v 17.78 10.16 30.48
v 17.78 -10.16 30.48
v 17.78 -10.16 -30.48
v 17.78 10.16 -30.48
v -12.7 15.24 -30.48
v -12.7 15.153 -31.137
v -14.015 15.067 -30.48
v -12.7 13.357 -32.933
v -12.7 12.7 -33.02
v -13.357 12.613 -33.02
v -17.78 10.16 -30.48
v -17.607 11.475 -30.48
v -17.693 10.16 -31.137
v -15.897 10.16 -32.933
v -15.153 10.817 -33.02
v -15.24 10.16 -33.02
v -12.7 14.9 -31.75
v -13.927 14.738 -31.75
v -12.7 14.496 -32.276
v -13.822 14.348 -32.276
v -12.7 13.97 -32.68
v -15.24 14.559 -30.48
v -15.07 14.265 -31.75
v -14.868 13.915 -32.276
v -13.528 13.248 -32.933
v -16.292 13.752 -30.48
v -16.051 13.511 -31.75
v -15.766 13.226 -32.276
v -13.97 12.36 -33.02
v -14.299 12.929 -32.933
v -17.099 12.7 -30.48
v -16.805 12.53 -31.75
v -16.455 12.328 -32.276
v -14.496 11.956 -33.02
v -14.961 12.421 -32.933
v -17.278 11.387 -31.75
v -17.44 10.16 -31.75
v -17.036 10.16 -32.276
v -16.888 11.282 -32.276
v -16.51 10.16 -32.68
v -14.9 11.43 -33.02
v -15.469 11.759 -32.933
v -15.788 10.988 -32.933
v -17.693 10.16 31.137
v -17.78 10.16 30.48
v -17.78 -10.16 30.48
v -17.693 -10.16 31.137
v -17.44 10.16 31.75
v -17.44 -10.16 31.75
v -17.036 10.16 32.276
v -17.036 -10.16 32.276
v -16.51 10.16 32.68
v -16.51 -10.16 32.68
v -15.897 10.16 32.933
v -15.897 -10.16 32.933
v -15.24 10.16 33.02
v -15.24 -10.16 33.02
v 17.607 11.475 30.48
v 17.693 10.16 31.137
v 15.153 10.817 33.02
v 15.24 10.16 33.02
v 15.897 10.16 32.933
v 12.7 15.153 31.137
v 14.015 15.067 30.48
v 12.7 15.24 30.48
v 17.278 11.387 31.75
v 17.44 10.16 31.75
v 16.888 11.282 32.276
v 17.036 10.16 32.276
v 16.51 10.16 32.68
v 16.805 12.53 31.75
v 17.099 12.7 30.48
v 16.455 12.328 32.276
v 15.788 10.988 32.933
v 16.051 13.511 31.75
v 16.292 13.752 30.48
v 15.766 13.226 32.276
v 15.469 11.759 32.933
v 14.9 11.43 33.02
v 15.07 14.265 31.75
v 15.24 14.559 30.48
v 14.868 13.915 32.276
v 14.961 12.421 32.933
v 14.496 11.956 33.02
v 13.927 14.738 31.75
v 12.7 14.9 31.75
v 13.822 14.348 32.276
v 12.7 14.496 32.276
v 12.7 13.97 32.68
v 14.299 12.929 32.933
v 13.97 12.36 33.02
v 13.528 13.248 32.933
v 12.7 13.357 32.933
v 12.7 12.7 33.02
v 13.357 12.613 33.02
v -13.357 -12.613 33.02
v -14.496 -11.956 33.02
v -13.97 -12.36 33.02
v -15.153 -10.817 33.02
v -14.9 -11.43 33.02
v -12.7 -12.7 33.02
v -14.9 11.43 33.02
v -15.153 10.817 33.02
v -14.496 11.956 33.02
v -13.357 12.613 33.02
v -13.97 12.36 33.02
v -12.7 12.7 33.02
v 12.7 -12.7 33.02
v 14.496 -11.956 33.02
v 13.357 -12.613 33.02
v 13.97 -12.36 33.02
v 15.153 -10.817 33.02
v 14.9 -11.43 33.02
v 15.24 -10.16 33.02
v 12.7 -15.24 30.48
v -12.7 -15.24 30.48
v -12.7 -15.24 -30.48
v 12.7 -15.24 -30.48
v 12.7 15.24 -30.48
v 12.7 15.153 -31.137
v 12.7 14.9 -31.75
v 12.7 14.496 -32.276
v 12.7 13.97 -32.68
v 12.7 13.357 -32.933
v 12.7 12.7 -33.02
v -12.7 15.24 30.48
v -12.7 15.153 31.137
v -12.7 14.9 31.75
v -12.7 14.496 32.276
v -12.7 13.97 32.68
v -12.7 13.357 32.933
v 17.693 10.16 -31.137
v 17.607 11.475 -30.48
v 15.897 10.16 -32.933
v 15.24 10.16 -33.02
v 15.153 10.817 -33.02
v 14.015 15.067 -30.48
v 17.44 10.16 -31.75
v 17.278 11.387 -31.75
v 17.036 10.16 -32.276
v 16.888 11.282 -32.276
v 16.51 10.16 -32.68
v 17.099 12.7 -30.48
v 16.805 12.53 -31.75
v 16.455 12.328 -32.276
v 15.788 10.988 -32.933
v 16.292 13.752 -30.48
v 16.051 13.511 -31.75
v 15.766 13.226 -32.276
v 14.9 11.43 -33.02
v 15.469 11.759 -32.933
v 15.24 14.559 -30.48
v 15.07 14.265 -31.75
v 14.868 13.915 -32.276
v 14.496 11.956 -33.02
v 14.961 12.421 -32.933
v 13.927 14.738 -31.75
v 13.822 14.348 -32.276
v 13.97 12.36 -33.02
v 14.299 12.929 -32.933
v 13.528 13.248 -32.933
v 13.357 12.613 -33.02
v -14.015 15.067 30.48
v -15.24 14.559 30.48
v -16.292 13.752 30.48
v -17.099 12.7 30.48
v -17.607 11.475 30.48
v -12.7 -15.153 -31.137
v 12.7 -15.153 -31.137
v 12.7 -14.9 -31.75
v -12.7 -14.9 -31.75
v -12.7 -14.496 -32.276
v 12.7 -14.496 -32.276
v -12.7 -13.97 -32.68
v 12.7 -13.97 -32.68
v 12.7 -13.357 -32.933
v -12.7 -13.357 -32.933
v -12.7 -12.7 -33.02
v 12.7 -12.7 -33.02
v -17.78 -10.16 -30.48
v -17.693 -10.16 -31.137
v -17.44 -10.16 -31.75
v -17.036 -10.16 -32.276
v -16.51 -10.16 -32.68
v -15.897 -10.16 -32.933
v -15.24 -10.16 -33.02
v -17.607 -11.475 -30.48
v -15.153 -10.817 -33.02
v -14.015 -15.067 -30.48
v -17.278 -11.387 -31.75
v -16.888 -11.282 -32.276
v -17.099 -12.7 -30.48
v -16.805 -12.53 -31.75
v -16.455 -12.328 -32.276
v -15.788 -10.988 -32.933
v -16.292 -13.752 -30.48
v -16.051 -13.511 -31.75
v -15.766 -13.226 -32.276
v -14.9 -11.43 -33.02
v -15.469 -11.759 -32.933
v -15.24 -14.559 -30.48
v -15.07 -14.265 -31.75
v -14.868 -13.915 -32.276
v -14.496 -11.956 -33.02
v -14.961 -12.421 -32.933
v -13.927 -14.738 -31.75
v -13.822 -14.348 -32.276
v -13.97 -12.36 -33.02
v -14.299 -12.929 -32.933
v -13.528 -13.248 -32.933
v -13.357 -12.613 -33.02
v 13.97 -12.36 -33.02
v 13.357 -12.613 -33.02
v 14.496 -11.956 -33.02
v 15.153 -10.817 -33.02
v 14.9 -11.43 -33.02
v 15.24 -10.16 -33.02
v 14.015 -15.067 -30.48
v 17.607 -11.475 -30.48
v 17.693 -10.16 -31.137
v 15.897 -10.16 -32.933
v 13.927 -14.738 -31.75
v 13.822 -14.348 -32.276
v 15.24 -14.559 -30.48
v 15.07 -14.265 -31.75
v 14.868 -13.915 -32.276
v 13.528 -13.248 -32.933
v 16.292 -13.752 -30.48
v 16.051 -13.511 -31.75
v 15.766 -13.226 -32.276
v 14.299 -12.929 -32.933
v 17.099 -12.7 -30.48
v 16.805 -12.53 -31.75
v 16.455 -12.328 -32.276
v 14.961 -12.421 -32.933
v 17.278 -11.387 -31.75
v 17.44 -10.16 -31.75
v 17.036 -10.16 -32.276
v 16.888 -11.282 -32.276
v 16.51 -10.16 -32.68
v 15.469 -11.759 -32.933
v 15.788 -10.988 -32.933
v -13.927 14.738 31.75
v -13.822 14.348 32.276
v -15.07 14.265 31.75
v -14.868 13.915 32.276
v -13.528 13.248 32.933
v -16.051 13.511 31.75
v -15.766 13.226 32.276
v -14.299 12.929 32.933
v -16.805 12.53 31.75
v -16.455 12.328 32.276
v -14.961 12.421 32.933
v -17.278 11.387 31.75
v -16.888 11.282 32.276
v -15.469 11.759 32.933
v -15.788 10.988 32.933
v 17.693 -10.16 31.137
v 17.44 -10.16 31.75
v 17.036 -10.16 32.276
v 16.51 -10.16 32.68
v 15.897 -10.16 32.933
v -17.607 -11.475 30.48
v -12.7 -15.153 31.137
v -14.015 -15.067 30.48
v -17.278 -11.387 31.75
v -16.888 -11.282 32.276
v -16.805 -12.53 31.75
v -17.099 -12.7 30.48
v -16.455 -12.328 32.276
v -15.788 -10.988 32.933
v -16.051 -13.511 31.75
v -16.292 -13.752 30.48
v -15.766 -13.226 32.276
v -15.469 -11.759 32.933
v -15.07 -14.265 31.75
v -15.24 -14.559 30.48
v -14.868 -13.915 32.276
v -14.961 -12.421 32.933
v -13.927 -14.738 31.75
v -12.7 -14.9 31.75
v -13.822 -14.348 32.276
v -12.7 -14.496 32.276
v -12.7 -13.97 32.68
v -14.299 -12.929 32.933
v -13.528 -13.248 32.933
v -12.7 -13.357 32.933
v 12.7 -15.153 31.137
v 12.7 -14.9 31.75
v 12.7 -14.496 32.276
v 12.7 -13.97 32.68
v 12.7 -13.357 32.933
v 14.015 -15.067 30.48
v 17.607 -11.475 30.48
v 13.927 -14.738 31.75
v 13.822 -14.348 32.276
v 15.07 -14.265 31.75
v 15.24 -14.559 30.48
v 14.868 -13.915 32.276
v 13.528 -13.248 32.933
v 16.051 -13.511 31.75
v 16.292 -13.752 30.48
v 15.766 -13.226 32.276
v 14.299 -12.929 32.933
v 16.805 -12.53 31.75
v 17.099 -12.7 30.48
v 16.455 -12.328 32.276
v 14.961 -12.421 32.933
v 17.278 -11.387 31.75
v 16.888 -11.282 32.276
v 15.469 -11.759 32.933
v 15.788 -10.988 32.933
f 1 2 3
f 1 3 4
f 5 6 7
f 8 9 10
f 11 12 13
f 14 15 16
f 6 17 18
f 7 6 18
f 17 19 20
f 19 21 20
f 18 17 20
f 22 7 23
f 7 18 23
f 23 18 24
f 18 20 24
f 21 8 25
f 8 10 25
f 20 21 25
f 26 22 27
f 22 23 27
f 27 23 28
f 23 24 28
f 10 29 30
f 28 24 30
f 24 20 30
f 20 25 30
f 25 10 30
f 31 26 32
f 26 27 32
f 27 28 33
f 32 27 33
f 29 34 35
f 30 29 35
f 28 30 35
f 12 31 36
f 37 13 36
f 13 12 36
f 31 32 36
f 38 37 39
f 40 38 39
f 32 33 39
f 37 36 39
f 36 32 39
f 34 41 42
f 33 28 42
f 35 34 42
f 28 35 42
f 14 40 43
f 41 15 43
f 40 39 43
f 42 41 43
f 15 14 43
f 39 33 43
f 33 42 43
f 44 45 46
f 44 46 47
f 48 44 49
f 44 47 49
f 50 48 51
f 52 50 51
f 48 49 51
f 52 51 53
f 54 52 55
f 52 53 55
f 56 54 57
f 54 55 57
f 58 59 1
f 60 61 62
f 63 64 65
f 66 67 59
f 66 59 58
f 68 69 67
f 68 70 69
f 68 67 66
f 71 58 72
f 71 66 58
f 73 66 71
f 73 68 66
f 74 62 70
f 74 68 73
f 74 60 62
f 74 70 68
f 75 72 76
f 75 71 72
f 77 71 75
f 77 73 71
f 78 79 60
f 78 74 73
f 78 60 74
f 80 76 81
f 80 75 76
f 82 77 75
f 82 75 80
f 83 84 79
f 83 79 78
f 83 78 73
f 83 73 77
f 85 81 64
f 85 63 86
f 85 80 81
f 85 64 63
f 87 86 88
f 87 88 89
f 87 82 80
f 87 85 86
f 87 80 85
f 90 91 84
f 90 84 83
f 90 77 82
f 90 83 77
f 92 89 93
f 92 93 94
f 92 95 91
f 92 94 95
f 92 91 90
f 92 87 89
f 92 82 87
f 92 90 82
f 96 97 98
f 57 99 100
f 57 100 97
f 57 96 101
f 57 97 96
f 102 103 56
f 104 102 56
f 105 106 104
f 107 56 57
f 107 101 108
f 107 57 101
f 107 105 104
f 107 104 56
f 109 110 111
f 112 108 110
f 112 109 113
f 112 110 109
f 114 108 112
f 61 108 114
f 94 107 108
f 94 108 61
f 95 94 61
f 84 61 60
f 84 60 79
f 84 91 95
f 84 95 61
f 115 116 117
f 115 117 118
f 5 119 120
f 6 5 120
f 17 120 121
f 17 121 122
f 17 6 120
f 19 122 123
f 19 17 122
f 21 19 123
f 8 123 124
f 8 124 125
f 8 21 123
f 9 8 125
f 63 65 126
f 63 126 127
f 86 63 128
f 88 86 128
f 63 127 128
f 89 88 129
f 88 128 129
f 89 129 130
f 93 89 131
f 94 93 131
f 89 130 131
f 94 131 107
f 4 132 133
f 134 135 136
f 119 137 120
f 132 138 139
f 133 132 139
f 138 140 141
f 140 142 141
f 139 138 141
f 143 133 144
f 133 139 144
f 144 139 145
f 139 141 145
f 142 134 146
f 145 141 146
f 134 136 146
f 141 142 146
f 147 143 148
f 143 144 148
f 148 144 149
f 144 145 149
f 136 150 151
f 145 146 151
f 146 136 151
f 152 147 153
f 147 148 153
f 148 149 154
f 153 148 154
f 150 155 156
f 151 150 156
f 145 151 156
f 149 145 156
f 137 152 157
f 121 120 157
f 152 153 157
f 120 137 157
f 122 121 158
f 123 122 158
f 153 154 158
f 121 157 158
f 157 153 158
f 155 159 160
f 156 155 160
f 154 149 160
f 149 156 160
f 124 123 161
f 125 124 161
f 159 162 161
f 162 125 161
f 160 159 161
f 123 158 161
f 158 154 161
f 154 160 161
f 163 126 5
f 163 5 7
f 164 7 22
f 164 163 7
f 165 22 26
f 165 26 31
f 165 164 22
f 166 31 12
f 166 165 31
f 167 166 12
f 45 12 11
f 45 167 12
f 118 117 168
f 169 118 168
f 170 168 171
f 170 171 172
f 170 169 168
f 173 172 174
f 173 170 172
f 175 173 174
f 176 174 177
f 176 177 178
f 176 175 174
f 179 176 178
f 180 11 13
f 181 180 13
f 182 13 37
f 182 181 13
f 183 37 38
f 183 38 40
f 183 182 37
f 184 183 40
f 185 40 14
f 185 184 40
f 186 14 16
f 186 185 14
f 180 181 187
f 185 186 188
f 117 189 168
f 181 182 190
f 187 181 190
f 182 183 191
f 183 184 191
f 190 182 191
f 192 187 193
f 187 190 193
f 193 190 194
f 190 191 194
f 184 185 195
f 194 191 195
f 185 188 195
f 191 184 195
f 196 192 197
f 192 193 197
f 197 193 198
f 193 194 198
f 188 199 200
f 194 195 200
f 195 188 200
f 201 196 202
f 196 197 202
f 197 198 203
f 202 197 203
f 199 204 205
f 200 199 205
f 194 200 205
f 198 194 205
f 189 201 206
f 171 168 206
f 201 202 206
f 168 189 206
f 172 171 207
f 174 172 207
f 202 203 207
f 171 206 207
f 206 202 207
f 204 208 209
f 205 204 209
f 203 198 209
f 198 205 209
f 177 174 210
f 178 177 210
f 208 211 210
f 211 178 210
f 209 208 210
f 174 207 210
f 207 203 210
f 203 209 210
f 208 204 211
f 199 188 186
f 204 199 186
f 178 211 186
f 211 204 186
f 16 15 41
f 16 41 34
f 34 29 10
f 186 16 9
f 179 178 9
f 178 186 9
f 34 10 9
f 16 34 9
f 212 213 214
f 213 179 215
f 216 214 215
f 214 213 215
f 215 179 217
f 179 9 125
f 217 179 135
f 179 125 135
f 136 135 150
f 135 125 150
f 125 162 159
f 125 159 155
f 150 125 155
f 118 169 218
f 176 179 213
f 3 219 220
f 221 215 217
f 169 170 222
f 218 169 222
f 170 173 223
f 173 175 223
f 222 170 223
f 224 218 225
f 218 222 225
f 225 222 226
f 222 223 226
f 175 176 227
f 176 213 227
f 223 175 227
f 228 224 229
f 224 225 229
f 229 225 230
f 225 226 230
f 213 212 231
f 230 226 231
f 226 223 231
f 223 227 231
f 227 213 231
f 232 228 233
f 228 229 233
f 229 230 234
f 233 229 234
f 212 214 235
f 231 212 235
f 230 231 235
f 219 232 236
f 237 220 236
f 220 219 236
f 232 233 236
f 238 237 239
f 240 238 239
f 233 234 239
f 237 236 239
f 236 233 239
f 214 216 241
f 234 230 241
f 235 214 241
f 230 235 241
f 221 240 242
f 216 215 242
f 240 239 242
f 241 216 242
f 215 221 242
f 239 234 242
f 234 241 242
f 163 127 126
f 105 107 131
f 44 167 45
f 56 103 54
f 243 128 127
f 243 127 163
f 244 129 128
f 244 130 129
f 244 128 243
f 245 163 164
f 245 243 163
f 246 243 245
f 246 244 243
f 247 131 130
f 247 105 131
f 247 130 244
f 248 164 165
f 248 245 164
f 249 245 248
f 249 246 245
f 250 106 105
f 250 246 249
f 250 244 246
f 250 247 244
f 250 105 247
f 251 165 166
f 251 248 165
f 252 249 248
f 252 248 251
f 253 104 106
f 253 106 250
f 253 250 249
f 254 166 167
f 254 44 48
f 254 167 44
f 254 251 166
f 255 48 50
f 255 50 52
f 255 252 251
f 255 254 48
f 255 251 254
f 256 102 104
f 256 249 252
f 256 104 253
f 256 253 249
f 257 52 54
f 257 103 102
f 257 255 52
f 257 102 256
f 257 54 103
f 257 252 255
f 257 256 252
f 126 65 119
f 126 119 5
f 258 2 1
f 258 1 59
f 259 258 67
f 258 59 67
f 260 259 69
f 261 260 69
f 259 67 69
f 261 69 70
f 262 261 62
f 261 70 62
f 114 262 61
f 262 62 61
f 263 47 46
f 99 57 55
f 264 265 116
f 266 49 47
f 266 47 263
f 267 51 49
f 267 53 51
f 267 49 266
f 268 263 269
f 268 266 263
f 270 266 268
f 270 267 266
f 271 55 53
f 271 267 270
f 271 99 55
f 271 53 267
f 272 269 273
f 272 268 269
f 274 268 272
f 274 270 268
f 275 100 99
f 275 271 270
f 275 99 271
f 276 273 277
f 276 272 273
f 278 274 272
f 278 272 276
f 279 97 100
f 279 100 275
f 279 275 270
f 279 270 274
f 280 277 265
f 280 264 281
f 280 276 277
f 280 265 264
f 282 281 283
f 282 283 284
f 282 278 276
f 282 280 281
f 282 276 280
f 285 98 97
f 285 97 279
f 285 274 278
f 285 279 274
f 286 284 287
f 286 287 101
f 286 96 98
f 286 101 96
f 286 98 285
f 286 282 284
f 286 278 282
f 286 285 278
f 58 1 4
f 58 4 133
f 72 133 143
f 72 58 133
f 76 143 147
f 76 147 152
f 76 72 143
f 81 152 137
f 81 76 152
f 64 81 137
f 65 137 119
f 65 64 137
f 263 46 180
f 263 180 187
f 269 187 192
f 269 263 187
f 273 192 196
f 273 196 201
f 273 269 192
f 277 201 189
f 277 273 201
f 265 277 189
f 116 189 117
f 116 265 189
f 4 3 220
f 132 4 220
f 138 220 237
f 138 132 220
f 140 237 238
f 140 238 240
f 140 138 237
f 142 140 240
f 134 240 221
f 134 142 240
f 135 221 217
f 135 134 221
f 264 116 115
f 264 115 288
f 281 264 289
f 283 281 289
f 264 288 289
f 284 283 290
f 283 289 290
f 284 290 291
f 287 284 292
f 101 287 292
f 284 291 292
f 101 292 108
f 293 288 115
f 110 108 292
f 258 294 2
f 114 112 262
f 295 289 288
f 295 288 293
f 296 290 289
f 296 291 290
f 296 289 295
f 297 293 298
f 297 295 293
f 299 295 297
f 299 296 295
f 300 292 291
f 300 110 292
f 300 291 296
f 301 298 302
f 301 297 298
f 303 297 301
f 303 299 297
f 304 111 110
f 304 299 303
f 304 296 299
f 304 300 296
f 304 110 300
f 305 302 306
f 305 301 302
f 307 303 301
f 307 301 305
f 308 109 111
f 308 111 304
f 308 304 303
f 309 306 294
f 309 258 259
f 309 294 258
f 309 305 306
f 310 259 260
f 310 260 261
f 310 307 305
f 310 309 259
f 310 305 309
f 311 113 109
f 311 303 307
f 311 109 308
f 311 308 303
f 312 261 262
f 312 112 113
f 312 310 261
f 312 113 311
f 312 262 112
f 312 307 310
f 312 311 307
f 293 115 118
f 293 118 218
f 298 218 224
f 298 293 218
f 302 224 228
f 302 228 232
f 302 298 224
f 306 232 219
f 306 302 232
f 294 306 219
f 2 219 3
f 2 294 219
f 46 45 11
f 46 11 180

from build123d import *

# Parameters (mm, degrees)
BOSS_EXTRUDE1_DEPTH = 33.02
FILLET1_R           = 2.54


with BuildPart() as part:
    # Sketch1 → Boss-Extrude1 (new body, symmetric)
    with BuildSketch(Plane.XY):
        with BuildLine():
            Line((-12.7, -15.24), (12.7, -15.24))
            ThreePointArc((12.7, -15.24), (16.292102448, -13.752102448), (17.78, -10.16))
            Line((17.78, -10.16), (17.78, 10.16))
            ThreePointArc((17.78, 10.16), (16.292102448, 13.752102448), (12.7, 15.24))
            Line((12.7, 15.24), (-12.7, 15.24))
            ThreePointArc((-12.7, 15.24), (-16.292102448, 13.752102448), (-17.78, 10.16))
            Line((-17.78, 10.16), (-17.78, -10.16))
            ThreePointArc((-17.78, -10.16), (-16.292102448, -13.752102448), (-12.7, -15.24))
        make_face()
    extrude(amount=BOSS_EXTRUDE1_DEPTH, both=True)

    # Fillet1
    fillet1_edges = [part.edges().sort_by_distance(p)[0] for p in [
        (-16.292102448, 13.752102448, 33.02),
        (0, 15.24, -33.02),
        (16.292102448, 13.752102448, -33.02),
        (-17.78, 0, 33.02),
        (-16.292102448, -13.752102448, 33.02),
        (0, -15.24, 33.02),
        (16.292102448, -13.752102448, 33.02),
        (17.78, 0, 33.02),
        (16.292102448, 13.752102448, 33.02),
        (0, 15.24, 33.02),
        (17.78, 0, -33.02),
        (16.292102448, -13.752102448, -33.02),
        (0, -15.24, -33.02),
        (-16.292102448, -13.752102448, -33.02),
        (-17.78, 0, -33.02),
        (-16.292102448, 13.752102448, -33.02),
    ]]
    fillet(fillet1_edges, radius=FILLET1_R)


solid = part.part
